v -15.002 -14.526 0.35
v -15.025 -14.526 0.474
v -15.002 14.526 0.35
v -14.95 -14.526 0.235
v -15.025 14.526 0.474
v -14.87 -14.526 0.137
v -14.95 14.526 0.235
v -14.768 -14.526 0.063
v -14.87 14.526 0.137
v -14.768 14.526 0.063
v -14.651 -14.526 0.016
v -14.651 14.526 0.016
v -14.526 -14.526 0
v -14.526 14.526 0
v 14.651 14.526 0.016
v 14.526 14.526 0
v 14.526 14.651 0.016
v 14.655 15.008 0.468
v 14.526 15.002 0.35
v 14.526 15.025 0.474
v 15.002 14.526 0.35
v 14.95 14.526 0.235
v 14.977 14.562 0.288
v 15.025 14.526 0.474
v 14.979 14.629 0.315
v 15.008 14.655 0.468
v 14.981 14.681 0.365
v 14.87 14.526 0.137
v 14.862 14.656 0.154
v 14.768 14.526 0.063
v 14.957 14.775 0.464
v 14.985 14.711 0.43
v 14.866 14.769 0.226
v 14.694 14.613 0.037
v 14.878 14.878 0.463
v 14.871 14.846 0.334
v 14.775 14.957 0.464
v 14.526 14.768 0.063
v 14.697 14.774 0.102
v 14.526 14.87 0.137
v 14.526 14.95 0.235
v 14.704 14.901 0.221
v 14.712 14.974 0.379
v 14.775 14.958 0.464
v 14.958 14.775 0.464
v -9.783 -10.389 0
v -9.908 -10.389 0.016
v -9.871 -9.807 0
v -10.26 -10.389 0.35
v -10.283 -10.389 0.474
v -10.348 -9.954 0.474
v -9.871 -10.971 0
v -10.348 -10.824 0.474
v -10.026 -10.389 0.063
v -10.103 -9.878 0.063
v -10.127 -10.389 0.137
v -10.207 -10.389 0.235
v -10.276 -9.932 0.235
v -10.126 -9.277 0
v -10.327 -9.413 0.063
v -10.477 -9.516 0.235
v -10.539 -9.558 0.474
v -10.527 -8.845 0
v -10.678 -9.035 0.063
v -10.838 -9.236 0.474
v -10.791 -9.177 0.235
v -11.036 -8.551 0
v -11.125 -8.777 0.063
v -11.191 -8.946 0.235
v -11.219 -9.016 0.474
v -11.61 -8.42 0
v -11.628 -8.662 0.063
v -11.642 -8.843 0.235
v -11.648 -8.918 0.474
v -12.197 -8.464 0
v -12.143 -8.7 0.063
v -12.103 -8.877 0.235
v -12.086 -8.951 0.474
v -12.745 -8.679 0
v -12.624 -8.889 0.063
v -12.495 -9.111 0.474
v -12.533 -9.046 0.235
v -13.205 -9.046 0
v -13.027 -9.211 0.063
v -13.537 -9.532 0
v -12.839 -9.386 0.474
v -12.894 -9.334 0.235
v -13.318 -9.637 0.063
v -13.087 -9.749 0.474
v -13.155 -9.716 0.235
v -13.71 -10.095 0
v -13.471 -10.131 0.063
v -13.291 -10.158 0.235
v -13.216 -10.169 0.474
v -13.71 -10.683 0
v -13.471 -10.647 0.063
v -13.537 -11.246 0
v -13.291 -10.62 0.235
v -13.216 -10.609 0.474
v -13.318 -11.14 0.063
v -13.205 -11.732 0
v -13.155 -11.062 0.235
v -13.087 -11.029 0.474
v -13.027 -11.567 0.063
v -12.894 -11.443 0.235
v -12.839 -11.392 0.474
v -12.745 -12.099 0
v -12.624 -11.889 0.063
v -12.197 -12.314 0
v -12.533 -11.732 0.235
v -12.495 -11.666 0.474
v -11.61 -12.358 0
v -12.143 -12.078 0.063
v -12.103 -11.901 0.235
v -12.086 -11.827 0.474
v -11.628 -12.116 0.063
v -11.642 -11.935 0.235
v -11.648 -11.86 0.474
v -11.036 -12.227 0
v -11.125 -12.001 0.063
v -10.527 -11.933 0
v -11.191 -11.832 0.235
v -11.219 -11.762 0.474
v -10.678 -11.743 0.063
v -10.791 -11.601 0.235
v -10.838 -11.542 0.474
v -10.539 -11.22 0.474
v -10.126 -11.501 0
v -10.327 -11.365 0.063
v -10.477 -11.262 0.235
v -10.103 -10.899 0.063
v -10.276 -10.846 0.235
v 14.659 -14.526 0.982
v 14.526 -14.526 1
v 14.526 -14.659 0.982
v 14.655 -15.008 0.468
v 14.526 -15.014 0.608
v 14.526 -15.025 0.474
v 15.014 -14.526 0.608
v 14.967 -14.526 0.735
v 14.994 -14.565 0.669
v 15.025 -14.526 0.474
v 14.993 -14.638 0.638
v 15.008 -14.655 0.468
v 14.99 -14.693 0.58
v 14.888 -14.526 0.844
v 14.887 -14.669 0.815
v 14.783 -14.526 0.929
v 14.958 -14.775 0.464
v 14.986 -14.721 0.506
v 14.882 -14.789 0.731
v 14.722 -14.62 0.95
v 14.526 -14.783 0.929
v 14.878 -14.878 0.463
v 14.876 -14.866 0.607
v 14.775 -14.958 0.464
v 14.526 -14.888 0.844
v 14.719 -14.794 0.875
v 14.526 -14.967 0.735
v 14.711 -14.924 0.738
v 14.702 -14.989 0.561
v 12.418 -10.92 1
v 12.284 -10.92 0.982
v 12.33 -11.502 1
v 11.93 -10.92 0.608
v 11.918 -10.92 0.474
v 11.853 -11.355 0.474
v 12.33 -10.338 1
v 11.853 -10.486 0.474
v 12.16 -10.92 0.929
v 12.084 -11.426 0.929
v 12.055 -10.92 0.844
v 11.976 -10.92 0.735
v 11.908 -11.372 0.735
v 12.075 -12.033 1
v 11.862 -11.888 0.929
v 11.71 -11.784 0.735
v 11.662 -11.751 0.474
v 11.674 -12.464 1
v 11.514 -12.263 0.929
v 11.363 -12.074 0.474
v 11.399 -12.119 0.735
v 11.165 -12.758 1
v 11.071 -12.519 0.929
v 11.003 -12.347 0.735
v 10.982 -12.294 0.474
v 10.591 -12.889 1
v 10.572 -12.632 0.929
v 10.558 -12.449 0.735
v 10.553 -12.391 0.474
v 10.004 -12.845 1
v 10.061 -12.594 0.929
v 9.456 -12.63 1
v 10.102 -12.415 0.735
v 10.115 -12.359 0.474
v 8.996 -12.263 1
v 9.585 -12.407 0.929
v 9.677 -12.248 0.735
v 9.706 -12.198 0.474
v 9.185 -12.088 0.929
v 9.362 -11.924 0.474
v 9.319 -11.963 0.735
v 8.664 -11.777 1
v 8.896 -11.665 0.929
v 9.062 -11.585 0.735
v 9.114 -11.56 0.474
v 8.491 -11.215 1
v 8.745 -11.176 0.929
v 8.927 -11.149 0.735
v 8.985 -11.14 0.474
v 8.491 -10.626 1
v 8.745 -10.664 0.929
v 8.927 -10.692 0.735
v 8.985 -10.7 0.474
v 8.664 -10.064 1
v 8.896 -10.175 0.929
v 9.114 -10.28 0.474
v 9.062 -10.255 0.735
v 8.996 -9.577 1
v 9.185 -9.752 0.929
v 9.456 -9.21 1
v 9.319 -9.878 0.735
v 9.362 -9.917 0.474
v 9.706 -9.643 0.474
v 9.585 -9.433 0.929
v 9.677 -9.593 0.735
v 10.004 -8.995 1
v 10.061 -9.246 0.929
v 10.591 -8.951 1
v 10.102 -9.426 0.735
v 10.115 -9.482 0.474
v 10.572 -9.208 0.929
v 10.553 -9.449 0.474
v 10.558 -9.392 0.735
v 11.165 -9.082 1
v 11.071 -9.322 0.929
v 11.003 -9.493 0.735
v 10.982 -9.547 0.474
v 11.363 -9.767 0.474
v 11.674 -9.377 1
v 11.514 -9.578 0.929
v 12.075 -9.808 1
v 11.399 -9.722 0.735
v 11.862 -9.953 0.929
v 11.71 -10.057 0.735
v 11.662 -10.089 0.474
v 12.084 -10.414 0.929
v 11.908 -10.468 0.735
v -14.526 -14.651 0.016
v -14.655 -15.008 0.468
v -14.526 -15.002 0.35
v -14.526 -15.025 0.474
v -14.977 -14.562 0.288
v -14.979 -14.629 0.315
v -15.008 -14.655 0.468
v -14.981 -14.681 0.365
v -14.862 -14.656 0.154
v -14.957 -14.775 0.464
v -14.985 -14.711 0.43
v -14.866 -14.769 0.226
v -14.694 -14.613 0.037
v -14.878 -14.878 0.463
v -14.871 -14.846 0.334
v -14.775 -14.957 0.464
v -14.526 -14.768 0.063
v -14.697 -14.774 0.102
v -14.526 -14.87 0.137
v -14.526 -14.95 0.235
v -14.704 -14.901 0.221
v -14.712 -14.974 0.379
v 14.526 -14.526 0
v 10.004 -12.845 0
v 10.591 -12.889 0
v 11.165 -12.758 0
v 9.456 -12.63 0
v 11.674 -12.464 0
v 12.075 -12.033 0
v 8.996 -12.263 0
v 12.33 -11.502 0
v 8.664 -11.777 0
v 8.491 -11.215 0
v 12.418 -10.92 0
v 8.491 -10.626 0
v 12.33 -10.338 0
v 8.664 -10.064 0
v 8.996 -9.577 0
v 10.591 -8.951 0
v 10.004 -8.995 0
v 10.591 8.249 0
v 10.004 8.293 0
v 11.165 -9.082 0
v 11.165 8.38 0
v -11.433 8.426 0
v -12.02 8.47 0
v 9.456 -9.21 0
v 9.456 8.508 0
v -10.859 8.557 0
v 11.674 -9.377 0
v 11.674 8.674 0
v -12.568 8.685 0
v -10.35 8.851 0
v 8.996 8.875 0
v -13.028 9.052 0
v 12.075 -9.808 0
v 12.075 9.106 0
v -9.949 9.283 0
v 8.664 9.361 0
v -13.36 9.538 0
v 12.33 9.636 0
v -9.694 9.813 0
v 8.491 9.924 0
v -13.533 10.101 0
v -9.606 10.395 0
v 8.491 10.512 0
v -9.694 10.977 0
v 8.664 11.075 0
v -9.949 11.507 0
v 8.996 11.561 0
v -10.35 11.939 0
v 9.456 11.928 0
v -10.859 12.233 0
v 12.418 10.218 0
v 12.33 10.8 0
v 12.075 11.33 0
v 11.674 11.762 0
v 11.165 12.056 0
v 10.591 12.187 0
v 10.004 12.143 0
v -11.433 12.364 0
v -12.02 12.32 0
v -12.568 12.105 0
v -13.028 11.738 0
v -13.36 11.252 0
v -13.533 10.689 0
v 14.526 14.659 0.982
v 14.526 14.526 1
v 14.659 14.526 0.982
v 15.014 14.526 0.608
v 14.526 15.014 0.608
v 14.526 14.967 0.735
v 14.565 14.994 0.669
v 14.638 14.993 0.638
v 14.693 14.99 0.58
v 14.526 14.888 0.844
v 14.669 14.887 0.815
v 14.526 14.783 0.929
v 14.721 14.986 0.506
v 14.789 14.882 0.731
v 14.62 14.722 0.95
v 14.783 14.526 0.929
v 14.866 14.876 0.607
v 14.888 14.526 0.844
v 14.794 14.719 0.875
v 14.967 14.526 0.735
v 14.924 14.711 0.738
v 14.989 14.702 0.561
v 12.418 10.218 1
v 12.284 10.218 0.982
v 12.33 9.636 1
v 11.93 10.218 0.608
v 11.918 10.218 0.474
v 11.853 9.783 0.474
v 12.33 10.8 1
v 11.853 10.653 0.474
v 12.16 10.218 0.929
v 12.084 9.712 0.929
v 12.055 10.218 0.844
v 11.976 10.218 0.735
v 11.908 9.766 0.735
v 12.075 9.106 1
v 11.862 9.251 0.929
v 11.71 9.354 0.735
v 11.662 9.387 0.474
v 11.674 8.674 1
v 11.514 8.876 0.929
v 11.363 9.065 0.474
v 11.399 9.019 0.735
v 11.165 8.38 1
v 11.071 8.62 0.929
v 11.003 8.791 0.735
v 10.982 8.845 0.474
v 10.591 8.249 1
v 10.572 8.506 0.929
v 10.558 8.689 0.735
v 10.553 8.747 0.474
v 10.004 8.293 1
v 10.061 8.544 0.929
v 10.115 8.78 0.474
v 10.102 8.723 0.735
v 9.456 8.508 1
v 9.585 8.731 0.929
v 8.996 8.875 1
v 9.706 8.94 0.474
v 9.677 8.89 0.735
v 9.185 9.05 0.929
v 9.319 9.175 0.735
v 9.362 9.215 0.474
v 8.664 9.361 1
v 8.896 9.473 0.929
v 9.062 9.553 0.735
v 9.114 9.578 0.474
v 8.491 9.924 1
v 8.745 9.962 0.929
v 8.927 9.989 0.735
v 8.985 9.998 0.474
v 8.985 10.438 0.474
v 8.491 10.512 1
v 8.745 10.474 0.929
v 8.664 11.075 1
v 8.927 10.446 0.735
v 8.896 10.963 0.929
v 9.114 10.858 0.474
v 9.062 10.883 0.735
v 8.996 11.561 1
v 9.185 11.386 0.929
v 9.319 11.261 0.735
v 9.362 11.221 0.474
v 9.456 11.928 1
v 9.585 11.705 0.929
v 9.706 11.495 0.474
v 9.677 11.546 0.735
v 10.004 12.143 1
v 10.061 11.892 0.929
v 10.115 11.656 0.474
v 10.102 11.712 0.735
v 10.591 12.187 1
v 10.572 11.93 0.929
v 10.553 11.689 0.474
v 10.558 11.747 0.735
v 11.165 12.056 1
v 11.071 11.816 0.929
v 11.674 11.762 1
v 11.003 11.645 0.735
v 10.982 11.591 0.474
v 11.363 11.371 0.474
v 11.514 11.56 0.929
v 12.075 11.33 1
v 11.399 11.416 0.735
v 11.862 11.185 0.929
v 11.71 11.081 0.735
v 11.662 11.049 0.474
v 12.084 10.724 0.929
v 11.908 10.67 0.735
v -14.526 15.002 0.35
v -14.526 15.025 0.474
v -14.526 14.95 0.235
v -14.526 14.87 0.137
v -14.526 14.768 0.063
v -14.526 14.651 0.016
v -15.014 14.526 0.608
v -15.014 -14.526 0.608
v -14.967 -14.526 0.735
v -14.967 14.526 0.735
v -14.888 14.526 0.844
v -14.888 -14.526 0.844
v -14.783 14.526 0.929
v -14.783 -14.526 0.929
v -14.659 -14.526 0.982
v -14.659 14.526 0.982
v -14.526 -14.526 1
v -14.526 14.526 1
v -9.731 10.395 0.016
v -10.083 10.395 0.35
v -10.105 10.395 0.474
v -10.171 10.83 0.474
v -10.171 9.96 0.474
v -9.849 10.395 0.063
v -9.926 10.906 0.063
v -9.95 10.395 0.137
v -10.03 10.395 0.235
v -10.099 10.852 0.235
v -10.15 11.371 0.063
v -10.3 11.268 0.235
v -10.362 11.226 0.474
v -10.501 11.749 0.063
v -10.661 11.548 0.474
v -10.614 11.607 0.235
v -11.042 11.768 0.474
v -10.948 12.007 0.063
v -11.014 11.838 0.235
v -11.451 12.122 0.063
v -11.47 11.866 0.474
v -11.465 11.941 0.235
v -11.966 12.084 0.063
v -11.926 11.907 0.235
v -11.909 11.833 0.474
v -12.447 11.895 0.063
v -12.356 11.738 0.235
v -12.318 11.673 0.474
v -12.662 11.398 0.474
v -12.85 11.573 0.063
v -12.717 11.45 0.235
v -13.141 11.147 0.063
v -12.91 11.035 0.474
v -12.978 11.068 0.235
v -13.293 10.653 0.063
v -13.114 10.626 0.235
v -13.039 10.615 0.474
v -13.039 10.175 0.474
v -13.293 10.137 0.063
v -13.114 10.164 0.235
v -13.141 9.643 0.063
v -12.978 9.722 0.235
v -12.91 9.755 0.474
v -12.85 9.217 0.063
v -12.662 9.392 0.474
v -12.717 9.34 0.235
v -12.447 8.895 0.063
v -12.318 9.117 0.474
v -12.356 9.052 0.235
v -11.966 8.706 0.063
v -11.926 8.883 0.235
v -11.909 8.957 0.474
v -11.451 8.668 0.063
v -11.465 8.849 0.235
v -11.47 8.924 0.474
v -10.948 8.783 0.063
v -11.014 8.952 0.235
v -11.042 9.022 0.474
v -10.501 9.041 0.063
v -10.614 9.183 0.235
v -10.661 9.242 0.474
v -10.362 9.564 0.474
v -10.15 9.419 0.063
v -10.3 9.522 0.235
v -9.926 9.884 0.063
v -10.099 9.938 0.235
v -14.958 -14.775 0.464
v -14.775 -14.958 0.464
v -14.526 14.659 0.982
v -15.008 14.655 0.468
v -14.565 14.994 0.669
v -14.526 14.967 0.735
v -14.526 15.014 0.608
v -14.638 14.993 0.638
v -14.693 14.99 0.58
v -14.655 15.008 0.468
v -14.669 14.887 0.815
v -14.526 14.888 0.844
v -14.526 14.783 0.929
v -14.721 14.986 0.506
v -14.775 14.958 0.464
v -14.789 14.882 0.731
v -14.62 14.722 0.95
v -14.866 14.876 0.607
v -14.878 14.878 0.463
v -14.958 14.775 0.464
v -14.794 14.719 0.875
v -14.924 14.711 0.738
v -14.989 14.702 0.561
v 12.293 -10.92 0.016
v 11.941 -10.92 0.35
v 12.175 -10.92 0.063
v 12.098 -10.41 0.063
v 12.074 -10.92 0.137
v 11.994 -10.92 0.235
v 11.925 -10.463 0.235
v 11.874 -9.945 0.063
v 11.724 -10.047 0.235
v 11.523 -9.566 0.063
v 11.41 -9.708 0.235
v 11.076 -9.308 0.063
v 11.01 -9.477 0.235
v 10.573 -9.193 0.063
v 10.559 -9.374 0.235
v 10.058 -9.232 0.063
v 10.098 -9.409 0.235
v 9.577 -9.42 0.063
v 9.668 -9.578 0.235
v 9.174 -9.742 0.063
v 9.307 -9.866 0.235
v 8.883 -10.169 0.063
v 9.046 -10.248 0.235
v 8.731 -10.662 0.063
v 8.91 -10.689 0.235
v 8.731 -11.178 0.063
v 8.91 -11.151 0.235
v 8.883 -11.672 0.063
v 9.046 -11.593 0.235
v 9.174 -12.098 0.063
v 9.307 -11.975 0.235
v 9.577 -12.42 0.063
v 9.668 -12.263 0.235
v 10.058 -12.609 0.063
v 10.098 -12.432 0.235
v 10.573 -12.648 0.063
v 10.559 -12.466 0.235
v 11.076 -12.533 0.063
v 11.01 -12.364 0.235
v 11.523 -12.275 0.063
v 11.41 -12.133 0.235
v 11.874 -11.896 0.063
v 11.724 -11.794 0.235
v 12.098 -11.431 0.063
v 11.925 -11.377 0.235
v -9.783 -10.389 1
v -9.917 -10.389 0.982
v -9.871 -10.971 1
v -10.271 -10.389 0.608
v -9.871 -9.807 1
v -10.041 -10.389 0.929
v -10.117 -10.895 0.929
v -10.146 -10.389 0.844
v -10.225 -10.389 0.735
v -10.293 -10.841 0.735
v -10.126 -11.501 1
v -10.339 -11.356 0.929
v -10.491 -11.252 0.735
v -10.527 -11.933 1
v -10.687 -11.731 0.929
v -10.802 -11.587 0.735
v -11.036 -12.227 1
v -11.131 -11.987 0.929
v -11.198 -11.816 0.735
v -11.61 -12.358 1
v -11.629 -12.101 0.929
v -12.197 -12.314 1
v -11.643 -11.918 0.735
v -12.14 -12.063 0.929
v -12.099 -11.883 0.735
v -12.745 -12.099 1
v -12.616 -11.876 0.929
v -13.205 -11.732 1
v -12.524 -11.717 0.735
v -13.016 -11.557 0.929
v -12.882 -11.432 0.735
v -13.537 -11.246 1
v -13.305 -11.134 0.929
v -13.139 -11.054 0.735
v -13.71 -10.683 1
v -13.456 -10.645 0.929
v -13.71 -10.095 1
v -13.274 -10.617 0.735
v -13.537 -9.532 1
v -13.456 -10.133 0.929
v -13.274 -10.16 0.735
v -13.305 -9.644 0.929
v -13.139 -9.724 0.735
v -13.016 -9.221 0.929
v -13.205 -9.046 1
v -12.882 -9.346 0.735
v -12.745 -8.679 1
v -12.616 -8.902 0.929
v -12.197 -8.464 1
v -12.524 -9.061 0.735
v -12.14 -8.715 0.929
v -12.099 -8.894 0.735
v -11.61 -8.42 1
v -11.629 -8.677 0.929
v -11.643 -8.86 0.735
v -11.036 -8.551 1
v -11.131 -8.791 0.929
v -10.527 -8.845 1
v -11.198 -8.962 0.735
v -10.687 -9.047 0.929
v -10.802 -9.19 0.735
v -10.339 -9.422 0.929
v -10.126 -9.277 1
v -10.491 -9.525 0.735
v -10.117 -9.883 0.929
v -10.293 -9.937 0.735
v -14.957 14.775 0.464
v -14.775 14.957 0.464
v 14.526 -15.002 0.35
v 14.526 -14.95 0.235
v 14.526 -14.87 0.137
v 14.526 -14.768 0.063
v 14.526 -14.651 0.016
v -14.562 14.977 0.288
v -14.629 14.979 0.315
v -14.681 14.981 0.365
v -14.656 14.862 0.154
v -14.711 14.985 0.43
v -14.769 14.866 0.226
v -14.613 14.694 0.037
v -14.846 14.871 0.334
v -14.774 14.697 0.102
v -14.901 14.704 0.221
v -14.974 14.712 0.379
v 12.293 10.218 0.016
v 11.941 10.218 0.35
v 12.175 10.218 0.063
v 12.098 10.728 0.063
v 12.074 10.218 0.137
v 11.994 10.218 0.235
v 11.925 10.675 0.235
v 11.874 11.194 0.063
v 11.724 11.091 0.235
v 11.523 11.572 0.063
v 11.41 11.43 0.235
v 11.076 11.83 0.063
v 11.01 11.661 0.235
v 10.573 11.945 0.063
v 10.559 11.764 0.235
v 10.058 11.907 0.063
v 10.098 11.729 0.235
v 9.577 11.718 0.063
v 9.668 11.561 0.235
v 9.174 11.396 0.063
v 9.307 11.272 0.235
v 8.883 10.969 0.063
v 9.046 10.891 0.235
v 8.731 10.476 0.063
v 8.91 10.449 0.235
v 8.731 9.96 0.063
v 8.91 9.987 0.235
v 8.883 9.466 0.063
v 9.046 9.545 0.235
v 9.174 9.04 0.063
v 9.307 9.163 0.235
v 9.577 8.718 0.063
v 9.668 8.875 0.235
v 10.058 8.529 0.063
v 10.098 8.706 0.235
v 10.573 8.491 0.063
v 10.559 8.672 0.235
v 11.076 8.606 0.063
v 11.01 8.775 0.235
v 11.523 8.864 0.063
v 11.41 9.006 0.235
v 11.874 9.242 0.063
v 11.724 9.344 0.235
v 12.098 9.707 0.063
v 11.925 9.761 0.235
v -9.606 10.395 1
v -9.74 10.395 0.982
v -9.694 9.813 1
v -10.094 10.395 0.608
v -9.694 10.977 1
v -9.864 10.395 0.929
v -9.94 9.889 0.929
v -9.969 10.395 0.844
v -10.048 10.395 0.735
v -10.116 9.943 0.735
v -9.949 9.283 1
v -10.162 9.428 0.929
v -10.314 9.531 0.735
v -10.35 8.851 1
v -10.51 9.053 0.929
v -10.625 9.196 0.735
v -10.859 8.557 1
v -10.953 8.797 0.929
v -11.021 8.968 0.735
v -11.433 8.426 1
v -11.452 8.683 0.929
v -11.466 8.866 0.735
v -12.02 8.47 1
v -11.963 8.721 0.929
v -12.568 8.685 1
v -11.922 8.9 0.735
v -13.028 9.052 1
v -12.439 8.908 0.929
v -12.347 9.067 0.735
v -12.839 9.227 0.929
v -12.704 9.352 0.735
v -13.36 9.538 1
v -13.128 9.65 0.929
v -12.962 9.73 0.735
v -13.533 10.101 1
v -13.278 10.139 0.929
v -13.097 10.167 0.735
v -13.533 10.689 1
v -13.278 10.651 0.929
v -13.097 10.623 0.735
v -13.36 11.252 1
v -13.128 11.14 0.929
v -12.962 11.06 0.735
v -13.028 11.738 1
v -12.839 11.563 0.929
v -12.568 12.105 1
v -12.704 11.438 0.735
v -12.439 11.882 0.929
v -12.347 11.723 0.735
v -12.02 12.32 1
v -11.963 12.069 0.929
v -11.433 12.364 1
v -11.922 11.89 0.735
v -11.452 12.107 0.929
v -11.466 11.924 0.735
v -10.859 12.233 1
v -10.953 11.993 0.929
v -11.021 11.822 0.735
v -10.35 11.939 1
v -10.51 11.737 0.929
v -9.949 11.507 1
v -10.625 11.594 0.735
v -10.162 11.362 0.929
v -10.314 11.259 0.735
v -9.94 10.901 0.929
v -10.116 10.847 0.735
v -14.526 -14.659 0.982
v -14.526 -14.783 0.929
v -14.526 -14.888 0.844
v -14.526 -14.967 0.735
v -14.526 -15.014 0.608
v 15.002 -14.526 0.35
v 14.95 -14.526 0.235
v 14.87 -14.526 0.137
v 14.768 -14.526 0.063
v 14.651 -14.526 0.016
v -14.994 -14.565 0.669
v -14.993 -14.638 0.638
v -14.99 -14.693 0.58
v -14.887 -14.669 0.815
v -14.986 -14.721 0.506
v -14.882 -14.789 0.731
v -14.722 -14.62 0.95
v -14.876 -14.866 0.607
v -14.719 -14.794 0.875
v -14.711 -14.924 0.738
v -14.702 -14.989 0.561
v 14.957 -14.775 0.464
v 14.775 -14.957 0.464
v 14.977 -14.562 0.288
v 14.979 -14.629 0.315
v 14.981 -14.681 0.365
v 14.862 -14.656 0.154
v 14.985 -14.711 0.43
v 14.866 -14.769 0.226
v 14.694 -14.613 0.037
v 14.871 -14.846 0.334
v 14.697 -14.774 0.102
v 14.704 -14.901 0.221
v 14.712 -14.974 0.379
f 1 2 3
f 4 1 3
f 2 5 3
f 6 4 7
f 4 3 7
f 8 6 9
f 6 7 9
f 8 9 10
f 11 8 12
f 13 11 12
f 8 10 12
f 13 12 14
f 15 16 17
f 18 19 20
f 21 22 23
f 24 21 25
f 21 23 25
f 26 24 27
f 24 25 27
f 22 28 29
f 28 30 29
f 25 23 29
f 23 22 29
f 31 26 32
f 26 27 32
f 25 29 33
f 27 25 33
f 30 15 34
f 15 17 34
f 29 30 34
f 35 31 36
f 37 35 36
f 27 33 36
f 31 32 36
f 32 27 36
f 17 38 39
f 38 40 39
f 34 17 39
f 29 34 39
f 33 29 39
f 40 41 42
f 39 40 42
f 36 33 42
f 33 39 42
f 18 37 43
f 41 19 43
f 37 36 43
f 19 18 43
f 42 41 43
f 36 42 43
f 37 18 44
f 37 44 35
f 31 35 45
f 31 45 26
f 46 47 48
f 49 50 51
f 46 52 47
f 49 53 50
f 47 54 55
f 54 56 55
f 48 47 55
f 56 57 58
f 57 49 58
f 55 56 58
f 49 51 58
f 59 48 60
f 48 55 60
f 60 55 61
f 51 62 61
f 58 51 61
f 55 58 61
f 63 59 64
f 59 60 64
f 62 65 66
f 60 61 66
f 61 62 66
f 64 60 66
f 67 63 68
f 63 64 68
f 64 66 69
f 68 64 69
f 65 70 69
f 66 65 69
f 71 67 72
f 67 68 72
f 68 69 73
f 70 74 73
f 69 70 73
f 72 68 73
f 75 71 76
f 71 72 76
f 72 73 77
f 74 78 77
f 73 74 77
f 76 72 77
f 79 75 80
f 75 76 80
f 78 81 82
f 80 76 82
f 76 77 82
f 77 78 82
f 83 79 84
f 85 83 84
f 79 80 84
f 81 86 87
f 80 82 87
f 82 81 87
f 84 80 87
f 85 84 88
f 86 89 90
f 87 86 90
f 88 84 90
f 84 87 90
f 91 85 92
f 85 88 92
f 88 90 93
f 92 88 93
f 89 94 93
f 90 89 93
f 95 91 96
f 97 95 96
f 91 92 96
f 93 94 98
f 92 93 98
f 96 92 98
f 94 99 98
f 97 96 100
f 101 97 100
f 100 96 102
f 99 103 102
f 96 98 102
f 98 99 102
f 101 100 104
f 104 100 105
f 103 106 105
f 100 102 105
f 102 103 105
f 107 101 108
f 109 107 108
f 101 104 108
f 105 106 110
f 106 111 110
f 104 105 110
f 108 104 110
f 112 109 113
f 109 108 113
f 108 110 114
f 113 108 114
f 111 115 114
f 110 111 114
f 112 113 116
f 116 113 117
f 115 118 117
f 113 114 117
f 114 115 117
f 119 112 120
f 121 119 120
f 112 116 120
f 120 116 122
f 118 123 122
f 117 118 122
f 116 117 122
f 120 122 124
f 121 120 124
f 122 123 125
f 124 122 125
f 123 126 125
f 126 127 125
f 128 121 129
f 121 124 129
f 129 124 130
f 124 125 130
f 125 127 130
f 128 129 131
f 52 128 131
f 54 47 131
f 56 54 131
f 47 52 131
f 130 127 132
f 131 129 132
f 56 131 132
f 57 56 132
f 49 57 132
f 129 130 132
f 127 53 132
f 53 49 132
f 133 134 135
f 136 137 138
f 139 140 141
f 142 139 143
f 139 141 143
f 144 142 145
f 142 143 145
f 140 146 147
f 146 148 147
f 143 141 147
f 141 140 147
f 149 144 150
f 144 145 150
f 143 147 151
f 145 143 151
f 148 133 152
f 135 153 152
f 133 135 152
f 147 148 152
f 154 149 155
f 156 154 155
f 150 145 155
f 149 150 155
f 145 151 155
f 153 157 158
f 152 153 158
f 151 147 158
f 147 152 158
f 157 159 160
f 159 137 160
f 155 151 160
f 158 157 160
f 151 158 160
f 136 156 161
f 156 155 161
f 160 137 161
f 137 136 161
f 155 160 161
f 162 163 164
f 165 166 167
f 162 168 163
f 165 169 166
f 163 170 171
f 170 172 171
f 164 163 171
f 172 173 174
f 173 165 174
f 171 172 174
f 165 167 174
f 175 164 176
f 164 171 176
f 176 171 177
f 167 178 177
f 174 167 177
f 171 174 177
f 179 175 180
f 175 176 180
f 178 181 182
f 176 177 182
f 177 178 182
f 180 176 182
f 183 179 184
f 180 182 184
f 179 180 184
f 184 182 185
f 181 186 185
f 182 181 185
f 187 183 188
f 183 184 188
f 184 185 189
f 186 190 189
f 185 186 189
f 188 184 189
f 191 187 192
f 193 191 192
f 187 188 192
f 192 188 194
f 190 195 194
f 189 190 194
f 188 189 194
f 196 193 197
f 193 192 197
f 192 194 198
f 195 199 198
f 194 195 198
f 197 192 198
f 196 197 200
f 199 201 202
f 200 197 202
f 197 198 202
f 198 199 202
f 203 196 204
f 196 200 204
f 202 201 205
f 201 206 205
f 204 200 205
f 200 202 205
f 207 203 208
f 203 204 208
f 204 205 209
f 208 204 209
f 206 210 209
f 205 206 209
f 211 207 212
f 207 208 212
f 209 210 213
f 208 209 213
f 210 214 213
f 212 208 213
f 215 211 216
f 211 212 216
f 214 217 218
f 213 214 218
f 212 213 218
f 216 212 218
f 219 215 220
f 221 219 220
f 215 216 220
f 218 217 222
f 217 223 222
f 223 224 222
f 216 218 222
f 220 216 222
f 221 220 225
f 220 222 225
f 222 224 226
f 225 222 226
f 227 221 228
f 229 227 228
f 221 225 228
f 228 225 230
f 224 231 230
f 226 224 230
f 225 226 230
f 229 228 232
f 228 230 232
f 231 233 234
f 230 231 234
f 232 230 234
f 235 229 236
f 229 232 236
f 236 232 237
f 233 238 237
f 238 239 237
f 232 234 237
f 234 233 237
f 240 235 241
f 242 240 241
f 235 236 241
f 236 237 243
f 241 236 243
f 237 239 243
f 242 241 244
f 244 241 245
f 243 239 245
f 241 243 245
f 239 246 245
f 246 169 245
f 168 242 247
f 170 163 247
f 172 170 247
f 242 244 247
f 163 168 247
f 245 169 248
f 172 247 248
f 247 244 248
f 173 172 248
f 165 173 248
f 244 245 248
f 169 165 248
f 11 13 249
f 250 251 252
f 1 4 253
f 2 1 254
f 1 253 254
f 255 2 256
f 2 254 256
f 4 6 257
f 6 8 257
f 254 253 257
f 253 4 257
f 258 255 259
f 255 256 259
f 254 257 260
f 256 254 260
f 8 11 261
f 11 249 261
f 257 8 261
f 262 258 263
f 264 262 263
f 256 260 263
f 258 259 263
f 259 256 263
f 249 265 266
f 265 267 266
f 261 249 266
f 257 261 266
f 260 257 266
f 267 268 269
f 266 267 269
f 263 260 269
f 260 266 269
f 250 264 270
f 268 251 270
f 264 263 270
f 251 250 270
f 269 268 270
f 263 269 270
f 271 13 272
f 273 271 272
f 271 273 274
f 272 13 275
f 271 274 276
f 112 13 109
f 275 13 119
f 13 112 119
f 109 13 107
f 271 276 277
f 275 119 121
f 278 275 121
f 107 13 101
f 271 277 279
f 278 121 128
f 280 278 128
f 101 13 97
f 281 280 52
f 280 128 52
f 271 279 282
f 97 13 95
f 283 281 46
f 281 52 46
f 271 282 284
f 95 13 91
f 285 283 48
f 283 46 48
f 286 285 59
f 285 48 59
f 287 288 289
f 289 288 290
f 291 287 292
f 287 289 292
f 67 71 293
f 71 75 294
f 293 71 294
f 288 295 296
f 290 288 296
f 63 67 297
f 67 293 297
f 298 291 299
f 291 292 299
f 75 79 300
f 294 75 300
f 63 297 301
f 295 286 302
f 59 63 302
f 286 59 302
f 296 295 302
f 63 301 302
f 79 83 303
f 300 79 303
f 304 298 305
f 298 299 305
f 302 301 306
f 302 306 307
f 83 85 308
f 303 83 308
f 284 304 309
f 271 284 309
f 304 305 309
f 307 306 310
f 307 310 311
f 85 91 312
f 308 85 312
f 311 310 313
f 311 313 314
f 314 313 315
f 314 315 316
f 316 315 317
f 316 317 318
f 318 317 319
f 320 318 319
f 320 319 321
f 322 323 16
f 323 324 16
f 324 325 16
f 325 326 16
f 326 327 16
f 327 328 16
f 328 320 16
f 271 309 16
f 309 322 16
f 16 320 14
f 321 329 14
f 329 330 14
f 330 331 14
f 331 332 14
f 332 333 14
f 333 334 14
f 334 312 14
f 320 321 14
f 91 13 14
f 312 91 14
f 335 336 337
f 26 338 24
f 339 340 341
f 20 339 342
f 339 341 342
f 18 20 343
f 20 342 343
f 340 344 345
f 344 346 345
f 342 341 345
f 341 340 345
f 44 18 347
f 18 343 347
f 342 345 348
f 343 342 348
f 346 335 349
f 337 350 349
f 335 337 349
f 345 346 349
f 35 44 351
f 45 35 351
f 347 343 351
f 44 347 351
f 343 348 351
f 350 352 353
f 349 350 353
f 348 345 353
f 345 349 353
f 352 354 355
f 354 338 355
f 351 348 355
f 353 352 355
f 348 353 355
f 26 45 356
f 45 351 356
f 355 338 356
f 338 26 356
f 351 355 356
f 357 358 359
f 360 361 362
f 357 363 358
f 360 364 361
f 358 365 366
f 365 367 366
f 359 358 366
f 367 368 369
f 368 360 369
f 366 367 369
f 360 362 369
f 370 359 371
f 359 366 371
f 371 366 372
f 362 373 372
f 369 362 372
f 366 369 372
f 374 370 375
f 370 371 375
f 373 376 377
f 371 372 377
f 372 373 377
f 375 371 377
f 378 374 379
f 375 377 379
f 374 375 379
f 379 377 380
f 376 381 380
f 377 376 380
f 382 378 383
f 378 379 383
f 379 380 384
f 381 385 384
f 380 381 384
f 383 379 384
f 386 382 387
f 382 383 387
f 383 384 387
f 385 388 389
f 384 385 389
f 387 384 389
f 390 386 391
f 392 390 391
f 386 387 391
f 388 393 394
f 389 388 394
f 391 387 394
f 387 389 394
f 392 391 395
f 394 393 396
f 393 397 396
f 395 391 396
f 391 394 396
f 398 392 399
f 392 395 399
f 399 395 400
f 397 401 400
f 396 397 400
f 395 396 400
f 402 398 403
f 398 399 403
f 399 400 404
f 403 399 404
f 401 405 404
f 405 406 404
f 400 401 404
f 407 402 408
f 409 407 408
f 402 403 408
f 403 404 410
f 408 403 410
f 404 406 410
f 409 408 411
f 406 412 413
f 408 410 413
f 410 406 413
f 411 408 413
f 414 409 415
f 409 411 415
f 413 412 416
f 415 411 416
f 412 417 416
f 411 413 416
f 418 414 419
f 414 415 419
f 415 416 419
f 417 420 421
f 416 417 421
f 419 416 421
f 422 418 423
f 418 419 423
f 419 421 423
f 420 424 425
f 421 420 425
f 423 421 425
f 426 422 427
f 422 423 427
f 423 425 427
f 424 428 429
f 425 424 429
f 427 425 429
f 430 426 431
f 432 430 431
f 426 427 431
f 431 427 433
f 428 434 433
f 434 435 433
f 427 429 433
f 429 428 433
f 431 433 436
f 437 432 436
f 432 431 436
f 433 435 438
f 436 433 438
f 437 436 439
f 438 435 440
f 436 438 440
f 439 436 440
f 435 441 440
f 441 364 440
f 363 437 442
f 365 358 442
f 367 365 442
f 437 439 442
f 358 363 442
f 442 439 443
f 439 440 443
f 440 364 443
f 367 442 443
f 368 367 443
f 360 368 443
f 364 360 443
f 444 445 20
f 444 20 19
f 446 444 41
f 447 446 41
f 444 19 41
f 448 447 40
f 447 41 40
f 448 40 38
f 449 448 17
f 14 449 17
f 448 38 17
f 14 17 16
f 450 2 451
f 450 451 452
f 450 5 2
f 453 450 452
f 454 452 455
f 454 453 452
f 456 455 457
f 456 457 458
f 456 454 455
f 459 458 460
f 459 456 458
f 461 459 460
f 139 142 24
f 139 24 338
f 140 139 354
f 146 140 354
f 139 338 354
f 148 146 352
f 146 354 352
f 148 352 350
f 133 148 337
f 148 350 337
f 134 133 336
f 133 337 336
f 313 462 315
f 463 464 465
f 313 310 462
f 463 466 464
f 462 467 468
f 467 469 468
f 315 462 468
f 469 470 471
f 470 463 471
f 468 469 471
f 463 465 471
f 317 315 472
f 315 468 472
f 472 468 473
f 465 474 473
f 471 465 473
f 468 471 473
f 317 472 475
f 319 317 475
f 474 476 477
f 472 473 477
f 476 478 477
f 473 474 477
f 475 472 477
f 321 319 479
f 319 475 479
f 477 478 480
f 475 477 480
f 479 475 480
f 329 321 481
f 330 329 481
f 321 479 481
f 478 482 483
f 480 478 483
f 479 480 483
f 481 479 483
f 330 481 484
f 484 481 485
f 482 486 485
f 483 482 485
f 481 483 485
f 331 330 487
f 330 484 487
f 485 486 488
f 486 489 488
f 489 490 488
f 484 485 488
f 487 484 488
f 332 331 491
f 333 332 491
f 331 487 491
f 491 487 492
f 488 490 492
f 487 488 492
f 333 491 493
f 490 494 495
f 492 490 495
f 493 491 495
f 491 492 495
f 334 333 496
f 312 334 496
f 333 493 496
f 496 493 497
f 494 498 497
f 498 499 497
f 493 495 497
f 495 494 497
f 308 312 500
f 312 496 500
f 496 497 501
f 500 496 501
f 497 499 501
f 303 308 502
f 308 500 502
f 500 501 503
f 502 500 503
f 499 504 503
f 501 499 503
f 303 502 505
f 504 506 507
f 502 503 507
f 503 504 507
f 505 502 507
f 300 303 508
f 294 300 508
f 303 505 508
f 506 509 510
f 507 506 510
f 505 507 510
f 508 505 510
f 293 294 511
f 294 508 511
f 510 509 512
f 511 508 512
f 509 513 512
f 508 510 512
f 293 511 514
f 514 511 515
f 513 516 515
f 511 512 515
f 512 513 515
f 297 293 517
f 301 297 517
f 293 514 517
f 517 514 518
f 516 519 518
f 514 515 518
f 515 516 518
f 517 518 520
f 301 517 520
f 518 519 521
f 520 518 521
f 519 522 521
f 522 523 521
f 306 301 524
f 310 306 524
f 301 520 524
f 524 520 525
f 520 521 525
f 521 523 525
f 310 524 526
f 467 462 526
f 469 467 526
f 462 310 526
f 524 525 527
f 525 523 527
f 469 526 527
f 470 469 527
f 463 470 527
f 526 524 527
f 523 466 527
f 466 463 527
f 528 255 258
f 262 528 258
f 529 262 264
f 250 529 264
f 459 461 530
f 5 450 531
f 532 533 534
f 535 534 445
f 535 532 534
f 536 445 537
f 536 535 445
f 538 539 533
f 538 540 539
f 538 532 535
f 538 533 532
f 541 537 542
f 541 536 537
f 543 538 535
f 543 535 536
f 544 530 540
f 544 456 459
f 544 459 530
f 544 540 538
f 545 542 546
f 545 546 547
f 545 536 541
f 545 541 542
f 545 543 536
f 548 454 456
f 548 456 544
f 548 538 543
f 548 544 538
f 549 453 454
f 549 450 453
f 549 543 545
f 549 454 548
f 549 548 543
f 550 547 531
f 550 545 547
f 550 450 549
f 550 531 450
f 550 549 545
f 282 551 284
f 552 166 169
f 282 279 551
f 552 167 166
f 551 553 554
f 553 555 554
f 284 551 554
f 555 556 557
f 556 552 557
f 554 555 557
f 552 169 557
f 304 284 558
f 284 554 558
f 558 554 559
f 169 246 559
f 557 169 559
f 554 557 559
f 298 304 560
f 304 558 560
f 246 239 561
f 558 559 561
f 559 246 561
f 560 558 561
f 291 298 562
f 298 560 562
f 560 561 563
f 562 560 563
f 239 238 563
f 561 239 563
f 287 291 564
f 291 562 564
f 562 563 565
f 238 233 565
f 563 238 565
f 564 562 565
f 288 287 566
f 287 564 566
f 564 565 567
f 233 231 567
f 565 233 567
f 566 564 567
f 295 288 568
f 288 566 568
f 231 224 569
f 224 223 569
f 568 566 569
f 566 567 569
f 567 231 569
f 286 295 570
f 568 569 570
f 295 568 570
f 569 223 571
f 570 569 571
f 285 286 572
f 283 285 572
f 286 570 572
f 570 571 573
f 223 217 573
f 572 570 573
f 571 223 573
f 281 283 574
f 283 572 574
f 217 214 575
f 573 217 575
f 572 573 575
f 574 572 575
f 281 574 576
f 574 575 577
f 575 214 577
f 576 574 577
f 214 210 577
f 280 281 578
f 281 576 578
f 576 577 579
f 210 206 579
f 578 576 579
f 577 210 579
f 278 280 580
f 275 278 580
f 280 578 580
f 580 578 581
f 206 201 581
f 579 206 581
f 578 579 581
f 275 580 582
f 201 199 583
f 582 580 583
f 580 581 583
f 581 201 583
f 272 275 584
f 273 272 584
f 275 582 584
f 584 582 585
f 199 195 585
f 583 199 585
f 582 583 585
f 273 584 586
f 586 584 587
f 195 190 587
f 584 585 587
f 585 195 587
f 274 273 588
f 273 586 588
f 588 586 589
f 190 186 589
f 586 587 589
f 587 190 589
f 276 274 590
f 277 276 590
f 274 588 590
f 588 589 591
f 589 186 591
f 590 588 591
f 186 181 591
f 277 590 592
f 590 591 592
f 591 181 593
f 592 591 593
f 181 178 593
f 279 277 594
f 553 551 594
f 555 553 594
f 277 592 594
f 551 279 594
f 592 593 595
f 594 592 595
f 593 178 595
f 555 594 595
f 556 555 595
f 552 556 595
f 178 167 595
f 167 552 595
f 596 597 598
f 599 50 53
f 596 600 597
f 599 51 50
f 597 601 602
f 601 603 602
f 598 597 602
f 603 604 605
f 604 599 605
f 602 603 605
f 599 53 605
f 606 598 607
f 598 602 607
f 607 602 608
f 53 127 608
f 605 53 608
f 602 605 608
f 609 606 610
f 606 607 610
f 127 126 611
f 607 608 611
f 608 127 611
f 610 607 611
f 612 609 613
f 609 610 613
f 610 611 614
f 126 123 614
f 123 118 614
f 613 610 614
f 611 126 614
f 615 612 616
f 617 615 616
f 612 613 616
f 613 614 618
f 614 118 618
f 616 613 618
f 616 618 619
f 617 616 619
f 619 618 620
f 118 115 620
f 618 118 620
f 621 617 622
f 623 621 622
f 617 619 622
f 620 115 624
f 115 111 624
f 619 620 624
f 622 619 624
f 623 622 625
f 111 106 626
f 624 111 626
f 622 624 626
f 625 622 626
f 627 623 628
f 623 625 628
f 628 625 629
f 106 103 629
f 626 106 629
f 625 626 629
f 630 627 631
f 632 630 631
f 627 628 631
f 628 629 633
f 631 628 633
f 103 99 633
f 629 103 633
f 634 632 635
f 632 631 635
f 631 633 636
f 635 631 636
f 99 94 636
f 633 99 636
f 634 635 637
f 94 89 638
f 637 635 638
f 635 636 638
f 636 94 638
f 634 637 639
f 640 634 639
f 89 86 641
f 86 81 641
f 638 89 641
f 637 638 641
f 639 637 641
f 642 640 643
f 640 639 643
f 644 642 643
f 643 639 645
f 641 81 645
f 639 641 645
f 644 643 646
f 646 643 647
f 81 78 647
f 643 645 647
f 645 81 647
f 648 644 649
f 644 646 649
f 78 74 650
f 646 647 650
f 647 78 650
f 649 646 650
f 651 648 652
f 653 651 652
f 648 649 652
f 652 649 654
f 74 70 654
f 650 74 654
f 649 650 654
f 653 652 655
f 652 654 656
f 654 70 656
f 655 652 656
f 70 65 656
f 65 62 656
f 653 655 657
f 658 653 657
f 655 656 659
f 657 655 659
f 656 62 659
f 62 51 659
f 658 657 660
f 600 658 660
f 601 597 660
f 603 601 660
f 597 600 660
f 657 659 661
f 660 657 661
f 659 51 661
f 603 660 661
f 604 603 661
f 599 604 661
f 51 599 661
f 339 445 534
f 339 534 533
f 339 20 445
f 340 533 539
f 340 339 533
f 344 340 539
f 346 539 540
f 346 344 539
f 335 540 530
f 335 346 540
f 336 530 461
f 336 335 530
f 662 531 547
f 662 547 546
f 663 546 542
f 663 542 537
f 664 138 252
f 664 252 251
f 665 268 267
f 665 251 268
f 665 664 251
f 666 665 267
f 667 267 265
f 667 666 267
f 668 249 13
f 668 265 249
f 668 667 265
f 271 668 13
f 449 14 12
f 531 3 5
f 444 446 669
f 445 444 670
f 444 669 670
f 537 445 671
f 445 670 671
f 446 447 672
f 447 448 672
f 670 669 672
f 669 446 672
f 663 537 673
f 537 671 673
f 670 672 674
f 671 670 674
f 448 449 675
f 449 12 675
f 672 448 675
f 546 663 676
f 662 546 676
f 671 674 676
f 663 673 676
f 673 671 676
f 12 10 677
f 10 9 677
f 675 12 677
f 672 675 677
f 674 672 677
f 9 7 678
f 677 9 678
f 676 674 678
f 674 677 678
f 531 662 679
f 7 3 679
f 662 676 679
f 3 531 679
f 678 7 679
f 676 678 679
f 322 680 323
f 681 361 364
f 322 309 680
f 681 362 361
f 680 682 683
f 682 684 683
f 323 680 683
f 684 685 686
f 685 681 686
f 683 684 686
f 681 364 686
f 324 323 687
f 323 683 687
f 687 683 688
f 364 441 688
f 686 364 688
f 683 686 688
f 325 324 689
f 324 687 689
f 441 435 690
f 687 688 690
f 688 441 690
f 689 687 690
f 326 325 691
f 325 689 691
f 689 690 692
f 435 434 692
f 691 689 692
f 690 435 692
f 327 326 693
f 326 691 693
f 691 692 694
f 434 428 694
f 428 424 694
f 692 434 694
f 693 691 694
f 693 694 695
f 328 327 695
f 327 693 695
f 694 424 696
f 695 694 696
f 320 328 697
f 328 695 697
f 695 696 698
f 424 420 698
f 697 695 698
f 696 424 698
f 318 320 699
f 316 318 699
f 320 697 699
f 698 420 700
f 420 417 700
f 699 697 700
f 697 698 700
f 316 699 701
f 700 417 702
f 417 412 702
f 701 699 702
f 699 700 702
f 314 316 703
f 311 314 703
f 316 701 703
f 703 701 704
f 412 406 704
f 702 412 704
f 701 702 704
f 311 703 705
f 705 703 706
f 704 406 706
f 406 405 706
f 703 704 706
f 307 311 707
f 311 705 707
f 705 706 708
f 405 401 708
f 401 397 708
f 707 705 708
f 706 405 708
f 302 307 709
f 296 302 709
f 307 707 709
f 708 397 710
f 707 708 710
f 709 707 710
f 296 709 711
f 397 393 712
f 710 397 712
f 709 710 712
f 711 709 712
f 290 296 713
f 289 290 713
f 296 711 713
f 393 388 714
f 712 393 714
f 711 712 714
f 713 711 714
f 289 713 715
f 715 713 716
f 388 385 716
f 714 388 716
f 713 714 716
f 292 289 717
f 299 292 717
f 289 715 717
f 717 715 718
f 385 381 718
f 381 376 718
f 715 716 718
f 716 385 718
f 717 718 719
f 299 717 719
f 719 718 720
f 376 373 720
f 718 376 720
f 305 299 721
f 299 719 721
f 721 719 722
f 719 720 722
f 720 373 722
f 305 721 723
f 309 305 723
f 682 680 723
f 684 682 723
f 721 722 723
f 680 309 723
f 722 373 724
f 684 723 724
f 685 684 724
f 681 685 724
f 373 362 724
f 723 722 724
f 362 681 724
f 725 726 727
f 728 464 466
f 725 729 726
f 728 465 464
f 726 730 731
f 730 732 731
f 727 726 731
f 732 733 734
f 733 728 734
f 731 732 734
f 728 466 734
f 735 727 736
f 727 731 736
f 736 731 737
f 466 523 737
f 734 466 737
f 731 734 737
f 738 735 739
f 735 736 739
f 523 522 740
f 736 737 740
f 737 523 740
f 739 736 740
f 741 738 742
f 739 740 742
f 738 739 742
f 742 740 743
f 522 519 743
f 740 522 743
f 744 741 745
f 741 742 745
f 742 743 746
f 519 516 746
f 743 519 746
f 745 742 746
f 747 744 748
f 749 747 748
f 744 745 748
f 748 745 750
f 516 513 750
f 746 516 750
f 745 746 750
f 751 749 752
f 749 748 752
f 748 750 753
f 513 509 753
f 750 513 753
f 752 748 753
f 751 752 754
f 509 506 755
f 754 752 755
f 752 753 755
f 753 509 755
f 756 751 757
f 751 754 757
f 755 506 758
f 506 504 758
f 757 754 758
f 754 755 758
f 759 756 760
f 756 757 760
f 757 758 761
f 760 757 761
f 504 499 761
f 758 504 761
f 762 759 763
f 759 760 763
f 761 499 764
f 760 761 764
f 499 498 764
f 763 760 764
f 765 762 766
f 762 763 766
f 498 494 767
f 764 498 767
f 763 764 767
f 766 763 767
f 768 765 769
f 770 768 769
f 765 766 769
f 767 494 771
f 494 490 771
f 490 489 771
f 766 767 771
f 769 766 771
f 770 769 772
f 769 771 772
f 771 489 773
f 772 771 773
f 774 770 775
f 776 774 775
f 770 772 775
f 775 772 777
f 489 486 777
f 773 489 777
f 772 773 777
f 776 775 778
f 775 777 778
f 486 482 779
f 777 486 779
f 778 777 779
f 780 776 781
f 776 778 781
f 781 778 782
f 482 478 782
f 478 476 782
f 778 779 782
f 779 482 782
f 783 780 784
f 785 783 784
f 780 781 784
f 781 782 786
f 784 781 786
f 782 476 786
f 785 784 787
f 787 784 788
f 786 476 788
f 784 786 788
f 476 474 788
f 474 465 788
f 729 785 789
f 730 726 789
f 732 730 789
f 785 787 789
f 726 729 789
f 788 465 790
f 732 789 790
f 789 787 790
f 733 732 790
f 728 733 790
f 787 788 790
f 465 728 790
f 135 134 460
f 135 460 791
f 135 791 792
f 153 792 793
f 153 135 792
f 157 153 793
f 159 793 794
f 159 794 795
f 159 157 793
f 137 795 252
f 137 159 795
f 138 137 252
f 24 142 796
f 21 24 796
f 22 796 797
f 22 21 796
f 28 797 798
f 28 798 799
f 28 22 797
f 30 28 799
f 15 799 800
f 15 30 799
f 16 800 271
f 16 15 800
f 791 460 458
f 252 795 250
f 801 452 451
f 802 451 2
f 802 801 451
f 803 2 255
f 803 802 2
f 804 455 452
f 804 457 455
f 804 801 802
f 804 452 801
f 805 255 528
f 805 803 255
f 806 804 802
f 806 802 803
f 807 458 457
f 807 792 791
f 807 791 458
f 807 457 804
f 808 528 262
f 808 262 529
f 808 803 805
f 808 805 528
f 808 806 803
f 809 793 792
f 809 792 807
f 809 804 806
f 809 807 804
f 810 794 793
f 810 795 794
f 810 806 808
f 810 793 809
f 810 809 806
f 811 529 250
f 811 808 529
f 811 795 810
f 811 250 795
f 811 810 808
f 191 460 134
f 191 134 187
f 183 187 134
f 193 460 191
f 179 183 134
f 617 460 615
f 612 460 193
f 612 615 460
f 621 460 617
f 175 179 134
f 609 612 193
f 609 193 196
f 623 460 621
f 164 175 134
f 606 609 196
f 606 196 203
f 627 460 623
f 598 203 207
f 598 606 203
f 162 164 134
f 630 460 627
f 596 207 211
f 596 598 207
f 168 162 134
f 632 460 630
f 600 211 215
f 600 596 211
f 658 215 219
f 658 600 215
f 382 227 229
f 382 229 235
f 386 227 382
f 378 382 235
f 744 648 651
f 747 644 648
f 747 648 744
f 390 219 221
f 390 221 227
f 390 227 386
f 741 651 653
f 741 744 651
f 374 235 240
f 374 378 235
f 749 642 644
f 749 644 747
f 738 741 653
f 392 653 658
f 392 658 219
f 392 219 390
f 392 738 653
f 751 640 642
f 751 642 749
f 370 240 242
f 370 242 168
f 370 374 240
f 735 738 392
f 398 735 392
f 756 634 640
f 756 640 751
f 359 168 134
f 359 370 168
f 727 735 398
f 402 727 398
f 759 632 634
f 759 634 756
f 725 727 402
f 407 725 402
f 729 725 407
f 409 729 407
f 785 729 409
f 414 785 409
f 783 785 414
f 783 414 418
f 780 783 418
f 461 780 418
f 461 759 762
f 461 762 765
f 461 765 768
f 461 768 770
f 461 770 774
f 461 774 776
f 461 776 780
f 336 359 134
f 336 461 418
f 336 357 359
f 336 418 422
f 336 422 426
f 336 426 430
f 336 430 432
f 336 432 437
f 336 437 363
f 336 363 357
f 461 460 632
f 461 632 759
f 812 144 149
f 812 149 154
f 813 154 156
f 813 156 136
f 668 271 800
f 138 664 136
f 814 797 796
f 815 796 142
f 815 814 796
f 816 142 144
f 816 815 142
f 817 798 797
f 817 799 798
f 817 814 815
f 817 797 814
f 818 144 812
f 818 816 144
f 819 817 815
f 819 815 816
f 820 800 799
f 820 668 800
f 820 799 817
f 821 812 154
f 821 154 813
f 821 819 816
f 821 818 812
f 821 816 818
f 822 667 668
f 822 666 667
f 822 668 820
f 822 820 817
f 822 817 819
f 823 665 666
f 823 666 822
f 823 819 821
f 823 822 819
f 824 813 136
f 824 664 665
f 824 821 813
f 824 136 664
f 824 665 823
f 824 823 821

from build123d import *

# Parameters (mm, degrees)
F0_W     = 30
F0_H     = 30
F0_R     = 1.5
F1_DEPTH = 1
F1_TAPER = -3
F2_R     = 0.4999
F3_R     = 0.49999


# Not quite as in the source:
# - a fillet or chamfer is up to 0.001 mm smaller than in the source, because OpenCascade refuses the exact size


with BuildPart() as f1:
    # F0 (on Top) → F1 (new body)
    with BuildSketch(Plane.XY):
        Rectangle(F0_W, F0_H)
        with Locations((-11.7577761412, -10.388918221)):
            Circle(F0_R, mode=Mode.SUBTRACT)
        with Locations((10.4432478547, -10.9203271568)):
            Circle(F0_R, mode=Mode.SUBTRACT)
        with Locations((-11.5806385875, 10.3950165212)):
            Circle(F0_R, mode=Mode.SUBTRACT)
        with Locations((10.4432478547, 10.2178789675)):
            Circle(F0_R, mode=Mode.SUBTRACT)
    extrude(amount=F1_DEPTH, taper=F1_TAPER)

    # F2 (radius 0.5 in the source; OpenCascade refuses exactly that, so slightly less here)
    f2_edges = [f1.edges().sort_by_distance(p)[0] for p in [
        (0, -15.052408, 1),
        (0, -15, 0),
        (-15, 0, 0),
        (-15.052408, 0, 1),
        (15.052408, 0, 1),
        (0, 15.052408, 1),
        (0, 15, 0),
        (15, 0, 0),
        (-15.026204, -15.026204, 0.5),
        (15.026204, -15.026204, 0.5),
        (-15.026204, 15.026204, 0.5),
        (15.026204, 15.026204, 0.5),
    ]]
    fillet(f2_edges, radius=F2_R)

    # F3 (radius 0.5 in the source; OpenCascade refuses exactly that, so slightly less here)
    f3_edges = [f1.edges().sort_by_distance(p)[0] for p in [
        (8.995656, -10.920327, 1),
        (-13.205368, -10.388918, 1),
        (-13.028231, 10.395017, 1),
        (8.995656, 10.217879, 1),
        (8.943248, -10.920327, 0),
        (-13.257776, -10.388918, 0),
        (-13.080639, 10.395017, 0),
        (8.943248, 10.217879, 0),
    ]]
    fillet(f3_edges, radius=F3_R)


solid = f1.part
